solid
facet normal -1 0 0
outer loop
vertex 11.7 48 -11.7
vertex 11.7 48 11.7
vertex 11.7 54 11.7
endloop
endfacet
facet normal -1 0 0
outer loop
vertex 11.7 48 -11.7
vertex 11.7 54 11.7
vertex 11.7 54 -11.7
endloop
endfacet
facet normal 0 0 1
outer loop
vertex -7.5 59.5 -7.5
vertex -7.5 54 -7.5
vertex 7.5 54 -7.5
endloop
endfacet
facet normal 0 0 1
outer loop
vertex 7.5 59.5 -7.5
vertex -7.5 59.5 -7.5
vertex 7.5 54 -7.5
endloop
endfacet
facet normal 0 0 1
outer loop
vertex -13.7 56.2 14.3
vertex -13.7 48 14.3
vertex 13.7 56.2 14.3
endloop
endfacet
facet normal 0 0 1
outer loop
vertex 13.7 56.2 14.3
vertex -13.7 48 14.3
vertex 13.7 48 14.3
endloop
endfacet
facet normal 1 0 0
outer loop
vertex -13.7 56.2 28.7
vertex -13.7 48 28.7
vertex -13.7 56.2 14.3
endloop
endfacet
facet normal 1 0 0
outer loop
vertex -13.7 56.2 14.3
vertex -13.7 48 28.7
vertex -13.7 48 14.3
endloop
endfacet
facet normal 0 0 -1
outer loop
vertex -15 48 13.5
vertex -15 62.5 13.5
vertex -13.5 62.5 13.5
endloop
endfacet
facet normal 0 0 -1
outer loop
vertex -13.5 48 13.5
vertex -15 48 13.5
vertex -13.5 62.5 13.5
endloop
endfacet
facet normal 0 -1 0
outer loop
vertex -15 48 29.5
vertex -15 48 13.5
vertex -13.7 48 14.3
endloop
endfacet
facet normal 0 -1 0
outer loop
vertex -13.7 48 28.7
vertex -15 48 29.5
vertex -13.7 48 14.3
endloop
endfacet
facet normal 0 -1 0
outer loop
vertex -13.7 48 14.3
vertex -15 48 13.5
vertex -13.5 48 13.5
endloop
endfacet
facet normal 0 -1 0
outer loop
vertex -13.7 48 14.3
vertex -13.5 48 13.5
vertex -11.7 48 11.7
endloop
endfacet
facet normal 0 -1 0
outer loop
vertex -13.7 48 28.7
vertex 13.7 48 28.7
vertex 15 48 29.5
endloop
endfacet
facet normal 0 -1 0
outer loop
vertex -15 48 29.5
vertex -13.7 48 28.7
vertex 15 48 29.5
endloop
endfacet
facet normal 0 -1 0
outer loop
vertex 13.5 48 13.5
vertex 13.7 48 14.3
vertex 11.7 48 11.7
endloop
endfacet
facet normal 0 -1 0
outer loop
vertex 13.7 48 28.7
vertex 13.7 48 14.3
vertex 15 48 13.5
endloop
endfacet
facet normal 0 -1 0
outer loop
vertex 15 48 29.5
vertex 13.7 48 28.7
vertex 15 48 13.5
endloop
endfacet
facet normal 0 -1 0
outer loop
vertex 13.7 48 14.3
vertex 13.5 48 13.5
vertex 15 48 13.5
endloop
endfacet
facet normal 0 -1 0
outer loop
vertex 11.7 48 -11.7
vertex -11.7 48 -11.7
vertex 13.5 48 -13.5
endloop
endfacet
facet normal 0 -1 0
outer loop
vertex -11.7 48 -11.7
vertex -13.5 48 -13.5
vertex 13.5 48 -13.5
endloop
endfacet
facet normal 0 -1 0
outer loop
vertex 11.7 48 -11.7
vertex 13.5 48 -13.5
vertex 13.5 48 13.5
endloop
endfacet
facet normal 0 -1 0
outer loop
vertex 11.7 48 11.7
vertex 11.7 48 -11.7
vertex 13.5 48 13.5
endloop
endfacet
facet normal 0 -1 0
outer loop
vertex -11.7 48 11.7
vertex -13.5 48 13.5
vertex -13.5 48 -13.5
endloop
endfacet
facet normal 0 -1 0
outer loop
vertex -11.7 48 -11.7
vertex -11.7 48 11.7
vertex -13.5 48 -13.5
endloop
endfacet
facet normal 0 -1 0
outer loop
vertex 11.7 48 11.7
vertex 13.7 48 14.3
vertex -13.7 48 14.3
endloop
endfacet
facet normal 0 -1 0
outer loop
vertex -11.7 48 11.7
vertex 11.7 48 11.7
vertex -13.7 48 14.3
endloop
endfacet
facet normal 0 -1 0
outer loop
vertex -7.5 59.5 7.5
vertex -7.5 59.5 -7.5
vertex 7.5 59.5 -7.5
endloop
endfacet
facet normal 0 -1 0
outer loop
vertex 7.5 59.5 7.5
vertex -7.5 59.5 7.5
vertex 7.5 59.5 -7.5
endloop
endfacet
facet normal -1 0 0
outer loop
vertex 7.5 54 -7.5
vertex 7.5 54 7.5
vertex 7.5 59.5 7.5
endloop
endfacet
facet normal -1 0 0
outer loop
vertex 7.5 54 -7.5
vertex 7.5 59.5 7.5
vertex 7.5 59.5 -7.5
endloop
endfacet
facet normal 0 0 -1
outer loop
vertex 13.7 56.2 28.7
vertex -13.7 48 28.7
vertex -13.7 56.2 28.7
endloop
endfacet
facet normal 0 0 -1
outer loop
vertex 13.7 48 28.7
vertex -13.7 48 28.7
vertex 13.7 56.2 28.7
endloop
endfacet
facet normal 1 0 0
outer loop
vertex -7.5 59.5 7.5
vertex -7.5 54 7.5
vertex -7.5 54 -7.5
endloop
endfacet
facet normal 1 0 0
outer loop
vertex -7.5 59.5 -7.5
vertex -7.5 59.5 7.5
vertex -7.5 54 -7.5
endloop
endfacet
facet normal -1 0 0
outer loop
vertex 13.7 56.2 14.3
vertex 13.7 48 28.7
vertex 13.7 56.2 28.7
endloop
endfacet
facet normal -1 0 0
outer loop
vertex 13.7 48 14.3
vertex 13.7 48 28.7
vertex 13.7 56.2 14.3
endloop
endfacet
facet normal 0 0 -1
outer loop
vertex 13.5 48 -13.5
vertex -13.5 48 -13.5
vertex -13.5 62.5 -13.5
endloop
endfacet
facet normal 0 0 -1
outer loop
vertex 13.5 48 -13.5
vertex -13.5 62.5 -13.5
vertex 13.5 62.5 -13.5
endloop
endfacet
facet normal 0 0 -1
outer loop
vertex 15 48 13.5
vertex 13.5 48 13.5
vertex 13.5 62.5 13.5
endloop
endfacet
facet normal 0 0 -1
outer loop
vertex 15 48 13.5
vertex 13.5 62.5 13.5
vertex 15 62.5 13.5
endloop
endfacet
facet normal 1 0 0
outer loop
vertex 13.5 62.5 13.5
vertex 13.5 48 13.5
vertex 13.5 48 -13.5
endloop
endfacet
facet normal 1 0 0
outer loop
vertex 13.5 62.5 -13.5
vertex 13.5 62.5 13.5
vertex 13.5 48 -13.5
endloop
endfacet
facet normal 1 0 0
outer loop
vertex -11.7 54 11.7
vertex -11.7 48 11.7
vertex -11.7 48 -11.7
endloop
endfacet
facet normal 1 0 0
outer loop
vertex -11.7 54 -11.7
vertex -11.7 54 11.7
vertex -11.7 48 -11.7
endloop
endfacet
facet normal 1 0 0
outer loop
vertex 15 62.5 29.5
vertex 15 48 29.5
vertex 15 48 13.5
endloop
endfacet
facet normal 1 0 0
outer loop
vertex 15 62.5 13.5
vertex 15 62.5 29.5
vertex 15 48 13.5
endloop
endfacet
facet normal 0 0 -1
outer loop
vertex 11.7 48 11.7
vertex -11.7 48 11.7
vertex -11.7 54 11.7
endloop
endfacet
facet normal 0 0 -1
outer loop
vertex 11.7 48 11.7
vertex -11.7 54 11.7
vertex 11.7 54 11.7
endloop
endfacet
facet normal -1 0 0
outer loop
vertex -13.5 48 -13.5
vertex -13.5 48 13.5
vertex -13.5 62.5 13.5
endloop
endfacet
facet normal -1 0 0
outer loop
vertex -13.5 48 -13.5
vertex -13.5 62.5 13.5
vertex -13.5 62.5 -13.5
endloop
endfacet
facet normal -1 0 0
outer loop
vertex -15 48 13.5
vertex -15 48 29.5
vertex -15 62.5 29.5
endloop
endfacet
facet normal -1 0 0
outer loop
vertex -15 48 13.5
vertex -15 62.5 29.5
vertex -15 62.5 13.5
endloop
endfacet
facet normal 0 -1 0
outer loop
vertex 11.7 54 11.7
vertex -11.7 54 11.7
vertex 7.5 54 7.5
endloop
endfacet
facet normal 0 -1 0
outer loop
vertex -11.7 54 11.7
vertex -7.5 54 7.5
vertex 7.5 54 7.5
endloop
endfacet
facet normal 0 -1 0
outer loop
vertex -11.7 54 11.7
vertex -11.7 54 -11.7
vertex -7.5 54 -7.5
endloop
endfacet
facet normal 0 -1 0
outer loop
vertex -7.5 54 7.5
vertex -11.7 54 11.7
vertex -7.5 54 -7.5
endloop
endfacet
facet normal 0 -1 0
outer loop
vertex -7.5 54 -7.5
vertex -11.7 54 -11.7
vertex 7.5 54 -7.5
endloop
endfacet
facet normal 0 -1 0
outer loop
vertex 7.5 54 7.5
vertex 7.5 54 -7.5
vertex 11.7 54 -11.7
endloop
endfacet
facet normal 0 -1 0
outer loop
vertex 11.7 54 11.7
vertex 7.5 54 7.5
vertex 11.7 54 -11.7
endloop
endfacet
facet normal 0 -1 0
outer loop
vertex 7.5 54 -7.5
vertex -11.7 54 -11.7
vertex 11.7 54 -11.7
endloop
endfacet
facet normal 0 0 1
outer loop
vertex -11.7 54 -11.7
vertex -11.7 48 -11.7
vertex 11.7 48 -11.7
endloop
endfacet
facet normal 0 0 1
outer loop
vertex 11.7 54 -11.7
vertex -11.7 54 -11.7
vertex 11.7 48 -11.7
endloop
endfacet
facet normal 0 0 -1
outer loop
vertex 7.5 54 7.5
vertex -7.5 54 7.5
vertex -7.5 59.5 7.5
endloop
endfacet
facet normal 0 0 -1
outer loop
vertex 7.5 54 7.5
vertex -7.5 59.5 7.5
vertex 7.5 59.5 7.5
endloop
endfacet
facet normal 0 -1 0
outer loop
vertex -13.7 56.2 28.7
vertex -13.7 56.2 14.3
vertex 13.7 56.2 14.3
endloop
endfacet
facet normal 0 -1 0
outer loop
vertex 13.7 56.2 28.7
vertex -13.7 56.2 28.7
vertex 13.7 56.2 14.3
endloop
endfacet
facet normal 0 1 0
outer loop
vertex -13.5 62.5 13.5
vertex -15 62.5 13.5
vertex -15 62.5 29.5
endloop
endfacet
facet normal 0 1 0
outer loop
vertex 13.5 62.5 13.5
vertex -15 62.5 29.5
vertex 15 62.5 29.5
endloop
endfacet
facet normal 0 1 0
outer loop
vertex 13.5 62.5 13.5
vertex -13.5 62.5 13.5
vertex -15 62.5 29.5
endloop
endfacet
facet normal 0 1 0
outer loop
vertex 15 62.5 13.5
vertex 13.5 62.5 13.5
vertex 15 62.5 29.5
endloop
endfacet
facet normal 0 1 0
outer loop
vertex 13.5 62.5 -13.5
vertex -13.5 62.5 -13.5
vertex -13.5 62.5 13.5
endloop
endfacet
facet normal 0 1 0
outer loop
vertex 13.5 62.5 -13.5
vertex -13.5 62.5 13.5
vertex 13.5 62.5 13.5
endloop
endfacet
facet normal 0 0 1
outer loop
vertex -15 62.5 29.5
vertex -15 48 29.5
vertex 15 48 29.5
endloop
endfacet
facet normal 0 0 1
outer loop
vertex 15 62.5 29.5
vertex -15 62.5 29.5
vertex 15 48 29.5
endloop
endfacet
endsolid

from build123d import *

# Parameters (mm, degrees)
LID_BLOCK_START      = 48
SKETCH1_W            = 27
SKETCH1_H            = 27
LID_BLOCK_DEPTH      = 14.5
MAGNET_EAR_START     = 48
SKETCH2_W            = 30
SKETCH2_H            = 16
MAGNET_EAR_DEPTH     = 14.5
SKIRT_RECESS_START   = 48
SKETCH3_W            = 23.4
SKETCH3_H            = 23.4
SKIRT_RECESS_DEPTH   = 6
CUVETTE_CAVITY_START = 54
SKETCH4_W            = 15
SKETCH4_H            = 15
CUVETTE_CAVITY_DEPTH = 5.5
MAGNET_POCKET_START  = 48
SKETCH5_W            = 27.4
SKETCH5_H            = 14.4
MAGNET_POCKET_DEPTH  = 8.2


with BuildPart() as part:
    # Sketch1 → Lid_Block (new body)
    with BuildSketch(Plane(origin=(0, 0, 0), x_dir=(1, 0, 0), z_dir=(0, 1, 0)).offset(LID_BLOCK_START)):
        Rectangle(SKETCH1_W, SKETCH1_H)
    extrude(amount=LID_BLOCK_DEPTH)

    # Sketch2 → Magnet_Ear (add)
    with BuildSketch(Plane(origin=(0, 0, 0), x_dir=(1, 0, 0), z_dir=(0, 1, 0)).offset(MAGNET_EAR_START)):
        with Locations((0, -21.5)):
            Rectangle(SKETCH2_W, SKETCH2_H)
    extrude(amount=MAGNET_EAR_DEPTH)

    # Sketch3 → Skirt_Recess (cut)
    with BuildSketch(Plane(origin=(0, 0, 0), x_dir=(1, 0, 0), z_dir=(0, 1, 0)).offset(SKIRT_RECESS_START)):
        Rectangle(SKETCH3_W, SKETCH3_H)
    extrude(amount=SKIRT_RECESS_DEPTH, mode=Mode.SUBTRACT)

    # Sketch4 → Cuvette_Cavity (cut)
    with BuildSketch(Plane(origin=(0, 0, 0), x_dir=(1, 0, 0), z_dir=(0, 1, 0)).offset(CUVETTE_CAVITY_START)):
        Rectangle(SKETCH4_W, SKETCH4_H)
    extrude(amount=CUVETTE_CAVITY_DEPTH, mode=Mode.SUBTRACT)

    # Sketch5 → Magnet_Pocket (cut)
    with BuildSketch(Plane(origin=(0, 0, 0), x_dir=(1, 0, 0), z_dir=(0, 1, 0)).offset(MAGNET_POCKET_START)):
        with Locations((0, -21.5)):
            Rectangle(SKETCH5_W, SKETCH5_H)
    extrude(amount=MAGNET_POCKET_DEPTH, mode=Mode.SUBTRACT)


solid = part.part
